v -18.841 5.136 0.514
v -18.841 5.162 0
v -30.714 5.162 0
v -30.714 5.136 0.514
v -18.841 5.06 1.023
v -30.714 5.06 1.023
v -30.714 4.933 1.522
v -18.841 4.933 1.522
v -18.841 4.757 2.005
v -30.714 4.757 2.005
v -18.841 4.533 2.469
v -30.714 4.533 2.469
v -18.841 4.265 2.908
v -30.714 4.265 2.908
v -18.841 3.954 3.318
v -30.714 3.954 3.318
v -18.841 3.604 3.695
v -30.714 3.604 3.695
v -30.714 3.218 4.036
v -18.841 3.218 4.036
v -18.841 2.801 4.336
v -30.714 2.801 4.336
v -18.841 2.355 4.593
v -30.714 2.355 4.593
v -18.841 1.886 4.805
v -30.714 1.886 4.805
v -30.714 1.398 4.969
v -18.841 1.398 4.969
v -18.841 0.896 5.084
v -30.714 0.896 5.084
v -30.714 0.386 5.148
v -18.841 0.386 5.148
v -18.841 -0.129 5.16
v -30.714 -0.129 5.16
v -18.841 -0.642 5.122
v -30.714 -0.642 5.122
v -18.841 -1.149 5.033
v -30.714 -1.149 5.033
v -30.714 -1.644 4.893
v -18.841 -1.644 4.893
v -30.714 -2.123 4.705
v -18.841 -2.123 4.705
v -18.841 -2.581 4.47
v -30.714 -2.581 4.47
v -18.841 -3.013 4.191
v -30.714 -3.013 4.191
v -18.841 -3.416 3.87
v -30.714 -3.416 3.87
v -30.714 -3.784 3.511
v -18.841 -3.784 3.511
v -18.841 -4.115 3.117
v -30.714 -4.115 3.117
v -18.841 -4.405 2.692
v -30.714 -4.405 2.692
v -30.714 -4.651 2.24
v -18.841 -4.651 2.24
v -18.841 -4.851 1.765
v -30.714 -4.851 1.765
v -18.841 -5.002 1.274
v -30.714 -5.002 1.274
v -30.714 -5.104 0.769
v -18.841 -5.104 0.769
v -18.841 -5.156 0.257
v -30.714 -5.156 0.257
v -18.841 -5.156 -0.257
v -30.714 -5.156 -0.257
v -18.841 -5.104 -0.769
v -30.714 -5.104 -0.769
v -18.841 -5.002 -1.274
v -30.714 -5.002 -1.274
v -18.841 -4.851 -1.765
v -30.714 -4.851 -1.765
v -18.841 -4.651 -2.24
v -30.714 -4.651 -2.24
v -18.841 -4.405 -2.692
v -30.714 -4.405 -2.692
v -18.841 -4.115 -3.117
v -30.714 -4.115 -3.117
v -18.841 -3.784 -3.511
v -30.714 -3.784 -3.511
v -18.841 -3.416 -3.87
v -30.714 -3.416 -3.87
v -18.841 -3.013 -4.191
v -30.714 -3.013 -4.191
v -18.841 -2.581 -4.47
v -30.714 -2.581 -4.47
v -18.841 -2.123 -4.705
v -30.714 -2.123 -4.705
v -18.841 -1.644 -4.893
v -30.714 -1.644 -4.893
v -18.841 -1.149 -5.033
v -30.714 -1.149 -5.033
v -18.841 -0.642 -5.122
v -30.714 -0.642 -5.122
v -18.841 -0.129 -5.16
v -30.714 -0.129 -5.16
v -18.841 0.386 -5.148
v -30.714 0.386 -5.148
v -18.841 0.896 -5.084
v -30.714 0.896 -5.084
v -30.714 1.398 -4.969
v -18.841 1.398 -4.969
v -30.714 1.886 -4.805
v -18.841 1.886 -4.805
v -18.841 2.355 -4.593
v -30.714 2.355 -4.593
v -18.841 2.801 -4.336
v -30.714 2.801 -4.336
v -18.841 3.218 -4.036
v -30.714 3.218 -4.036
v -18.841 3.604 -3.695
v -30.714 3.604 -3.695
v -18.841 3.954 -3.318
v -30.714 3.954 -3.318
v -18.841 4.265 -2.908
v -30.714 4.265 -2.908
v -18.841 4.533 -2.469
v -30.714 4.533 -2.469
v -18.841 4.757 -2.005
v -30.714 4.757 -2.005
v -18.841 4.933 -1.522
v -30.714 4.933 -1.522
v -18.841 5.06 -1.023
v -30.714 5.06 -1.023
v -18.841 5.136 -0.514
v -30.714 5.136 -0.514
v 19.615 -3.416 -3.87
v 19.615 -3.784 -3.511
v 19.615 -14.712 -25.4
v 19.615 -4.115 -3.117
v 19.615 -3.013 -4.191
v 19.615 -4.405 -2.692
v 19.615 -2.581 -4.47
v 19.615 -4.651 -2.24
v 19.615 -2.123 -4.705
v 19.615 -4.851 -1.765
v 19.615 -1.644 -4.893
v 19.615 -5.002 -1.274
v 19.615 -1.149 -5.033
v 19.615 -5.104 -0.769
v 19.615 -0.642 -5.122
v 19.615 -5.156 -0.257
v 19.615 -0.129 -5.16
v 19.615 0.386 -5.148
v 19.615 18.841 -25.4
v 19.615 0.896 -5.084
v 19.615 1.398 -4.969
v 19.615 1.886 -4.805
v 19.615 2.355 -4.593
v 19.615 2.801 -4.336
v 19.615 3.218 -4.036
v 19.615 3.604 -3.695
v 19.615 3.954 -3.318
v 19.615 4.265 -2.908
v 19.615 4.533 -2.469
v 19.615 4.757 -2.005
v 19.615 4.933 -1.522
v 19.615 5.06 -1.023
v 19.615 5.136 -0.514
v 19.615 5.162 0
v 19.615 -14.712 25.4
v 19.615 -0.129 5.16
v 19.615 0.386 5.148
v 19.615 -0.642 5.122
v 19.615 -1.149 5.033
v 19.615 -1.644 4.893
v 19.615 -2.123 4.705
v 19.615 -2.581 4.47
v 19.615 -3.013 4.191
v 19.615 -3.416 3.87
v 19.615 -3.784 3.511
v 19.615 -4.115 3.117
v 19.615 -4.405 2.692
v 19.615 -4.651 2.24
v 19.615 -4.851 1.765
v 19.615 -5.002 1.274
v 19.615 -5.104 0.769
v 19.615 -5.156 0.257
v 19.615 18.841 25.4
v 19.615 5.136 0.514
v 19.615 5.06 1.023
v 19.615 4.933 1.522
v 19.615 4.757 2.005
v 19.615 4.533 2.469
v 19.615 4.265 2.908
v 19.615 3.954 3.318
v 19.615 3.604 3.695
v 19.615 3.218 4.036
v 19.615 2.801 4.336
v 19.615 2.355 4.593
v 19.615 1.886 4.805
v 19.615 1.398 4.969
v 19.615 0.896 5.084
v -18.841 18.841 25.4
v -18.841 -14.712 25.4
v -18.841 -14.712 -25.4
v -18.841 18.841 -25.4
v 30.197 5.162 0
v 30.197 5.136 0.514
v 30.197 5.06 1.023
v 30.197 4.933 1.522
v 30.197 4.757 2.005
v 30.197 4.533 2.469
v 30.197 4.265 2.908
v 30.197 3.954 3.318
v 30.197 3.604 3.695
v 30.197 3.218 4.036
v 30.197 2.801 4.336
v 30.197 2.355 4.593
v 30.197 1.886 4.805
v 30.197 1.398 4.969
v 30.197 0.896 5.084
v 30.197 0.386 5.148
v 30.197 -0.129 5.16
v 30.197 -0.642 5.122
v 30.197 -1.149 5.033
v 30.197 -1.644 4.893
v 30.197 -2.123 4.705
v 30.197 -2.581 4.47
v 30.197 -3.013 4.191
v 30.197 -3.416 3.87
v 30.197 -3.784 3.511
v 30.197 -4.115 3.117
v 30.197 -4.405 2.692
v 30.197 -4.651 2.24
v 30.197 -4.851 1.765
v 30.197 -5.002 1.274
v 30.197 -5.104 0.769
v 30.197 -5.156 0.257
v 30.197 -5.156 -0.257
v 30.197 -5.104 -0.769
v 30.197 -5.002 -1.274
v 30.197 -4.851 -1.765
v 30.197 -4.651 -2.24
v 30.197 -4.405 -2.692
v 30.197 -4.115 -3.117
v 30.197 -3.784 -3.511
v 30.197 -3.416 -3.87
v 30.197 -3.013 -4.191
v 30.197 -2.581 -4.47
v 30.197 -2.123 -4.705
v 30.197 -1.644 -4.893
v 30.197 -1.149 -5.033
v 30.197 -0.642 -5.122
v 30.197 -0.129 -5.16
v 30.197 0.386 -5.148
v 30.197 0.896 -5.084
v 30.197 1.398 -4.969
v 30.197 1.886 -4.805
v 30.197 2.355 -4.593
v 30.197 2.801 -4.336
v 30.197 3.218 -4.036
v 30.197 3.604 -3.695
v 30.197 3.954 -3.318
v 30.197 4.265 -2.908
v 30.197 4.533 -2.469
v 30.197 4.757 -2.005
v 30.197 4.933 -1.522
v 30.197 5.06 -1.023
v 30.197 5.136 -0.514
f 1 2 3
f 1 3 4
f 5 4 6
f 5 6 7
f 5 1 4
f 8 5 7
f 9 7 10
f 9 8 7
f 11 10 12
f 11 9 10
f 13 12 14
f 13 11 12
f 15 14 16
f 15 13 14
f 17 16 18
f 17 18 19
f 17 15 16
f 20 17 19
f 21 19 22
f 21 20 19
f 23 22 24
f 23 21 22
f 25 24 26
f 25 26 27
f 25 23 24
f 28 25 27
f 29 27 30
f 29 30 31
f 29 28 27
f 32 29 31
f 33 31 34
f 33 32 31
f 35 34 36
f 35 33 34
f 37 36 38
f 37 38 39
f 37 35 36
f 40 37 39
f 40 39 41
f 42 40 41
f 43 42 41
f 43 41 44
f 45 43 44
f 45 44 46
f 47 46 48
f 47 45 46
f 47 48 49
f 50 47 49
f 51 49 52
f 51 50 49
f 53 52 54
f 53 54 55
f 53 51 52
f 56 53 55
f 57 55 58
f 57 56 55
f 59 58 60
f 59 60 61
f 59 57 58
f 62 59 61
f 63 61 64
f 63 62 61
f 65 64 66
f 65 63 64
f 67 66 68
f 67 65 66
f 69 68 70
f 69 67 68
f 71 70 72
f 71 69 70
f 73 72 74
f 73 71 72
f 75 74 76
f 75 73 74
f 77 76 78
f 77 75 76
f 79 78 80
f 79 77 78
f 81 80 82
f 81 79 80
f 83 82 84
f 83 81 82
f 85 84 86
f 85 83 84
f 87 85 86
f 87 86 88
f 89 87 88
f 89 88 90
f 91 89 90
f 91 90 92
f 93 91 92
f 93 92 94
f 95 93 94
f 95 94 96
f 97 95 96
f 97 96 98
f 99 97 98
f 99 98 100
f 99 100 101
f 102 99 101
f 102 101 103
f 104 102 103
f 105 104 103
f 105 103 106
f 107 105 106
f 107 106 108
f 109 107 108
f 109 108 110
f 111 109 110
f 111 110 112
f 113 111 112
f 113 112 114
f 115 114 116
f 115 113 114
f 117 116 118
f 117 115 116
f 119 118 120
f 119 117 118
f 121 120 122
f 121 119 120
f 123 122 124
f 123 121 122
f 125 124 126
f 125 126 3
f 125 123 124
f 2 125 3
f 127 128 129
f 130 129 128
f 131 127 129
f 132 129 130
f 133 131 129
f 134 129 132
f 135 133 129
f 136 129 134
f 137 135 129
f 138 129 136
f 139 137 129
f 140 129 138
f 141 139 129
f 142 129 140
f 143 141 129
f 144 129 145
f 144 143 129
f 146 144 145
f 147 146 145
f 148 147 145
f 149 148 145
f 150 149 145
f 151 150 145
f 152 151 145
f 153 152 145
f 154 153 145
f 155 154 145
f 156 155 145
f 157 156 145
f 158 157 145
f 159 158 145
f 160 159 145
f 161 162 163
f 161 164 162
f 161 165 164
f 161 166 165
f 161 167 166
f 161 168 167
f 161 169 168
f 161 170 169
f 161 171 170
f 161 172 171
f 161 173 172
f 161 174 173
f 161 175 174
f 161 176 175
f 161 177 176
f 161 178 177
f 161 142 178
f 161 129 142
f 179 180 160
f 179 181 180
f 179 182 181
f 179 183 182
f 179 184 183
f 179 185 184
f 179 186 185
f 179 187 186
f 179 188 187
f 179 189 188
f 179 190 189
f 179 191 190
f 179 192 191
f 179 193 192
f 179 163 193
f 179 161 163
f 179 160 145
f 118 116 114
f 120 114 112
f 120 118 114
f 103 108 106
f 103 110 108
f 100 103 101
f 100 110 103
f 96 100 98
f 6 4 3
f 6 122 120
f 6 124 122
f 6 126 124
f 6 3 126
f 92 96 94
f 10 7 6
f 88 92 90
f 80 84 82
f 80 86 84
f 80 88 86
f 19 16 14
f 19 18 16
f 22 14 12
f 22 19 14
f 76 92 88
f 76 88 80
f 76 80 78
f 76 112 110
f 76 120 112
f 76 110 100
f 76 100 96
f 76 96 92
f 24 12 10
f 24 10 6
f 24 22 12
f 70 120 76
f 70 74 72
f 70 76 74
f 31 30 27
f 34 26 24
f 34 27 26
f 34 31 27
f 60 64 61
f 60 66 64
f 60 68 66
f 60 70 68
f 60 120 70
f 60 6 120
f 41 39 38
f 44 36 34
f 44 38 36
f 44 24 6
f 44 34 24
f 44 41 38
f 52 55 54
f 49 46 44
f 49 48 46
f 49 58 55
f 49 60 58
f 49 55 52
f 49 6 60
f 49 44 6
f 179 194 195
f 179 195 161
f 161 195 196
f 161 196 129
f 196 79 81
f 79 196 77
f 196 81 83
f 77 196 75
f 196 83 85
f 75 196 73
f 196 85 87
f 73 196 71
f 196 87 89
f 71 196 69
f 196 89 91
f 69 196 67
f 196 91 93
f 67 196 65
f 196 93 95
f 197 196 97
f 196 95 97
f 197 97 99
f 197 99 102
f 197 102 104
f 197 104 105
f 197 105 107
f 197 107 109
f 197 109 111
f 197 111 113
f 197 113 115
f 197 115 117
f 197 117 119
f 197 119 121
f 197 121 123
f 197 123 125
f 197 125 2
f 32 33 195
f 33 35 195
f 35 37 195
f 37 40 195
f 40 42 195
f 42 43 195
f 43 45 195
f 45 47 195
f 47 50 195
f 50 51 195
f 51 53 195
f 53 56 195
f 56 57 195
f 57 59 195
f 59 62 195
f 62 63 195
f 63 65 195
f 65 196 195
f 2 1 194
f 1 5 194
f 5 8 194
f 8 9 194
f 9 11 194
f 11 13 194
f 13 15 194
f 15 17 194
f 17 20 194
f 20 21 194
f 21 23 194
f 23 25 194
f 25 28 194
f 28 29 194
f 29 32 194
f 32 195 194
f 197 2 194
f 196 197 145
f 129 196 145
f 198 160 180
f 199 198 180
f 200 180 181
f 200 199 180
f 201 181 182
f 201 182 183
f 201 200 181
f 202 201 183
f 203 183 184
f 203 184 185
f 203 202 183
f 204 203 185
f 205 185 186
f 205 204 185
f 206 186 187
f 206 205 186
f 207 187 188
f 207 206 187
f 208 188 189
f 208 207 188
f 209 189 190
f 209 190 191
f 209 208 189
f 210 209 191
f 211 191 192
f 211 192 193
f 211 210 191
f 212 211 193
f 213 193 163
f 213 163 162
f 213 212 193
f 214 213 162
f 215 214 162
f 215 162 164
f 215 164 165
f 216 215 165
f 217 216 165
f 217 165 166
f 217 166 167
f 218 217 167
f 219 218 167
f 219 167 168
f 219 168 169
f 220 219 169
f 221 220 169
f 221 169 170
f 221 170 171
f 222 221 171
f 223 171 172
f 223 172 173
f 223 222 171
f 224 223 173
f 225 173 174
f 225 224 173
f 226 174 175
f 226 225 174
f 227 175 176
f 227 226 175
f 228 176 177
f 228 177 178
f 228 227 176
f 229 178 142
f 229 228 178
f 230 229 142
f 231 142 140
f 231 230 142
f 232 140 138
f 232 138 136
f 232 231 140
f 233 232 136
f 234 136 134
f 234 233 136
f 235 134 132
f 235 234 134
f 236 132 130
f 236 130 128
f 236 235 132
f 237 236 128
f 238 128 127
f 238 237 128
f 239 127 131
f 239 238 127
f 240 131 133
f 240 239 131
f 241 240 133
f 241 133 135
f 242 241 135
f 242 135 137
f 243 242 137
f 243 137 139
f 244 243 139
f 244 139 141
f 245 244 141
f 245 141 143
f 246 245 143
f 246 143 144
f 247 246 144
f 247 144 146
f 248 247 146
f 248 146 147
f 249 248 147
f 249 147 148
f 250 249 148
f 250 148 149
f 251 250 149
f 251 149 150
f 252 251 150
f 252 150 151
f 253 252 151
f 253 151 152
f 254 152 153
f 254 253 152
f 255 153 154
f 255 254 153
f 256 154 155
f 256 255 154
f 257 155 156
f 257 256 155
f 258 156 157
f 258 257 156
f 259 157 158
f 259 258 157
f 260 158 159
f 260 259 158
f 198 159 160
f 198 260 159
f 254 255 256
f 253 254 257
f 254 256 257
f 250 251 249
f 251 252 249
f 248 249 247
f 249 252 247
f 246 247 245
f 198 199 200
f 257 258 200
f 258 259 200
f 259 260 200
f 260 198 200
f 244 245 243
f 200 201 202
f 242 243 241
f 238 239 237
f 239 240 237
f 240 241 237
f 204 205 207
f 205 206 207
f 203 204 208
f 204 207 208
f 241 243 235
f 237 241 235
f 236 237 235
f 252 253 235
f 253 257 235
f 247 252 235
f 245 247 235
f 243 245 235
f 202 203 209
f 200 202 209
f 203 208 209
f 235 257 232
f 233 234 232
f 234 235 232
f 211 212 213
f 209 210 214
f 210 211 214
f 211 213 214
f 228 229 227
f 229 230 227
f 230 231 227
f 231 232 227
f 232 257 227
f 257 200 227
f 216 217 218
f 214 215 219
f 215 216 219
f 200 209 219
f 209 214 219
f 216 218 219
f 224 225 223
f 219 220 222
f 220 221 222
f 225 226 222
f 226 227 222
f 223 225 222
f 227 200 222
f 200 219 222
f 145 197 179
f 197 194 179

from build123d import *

# Parameters (mm, degrees)
F0_W     = 38.4564194828
F0_H     = 33.5525823757
F1_DEPTH = 25.4
F2_W     = 60.9108451754
F2_H     = 5.1619354635


with BuildPart() as f1:
    # F0 (on Top) → F1 (new body, symmetric)
    with BuildSketch(Plane.XY):
        with Locations((0.3871461377, 2.0647742786)):
            Rectangle(F0_W, F0_H)
    extrude(amount=F1_DEPTH, both=True)

    # F2 (on Top) → F3 (revolve)
    with BuildSketch(Plane.XY):
        with Locations((-0.2580946311, 2.5809677318)):
            Rectangle(F2_W, F2_H)
    revolve(axis=Axis((-0.2580946311, 0, 0), (1, 0, 0)))


solid = f1.part
